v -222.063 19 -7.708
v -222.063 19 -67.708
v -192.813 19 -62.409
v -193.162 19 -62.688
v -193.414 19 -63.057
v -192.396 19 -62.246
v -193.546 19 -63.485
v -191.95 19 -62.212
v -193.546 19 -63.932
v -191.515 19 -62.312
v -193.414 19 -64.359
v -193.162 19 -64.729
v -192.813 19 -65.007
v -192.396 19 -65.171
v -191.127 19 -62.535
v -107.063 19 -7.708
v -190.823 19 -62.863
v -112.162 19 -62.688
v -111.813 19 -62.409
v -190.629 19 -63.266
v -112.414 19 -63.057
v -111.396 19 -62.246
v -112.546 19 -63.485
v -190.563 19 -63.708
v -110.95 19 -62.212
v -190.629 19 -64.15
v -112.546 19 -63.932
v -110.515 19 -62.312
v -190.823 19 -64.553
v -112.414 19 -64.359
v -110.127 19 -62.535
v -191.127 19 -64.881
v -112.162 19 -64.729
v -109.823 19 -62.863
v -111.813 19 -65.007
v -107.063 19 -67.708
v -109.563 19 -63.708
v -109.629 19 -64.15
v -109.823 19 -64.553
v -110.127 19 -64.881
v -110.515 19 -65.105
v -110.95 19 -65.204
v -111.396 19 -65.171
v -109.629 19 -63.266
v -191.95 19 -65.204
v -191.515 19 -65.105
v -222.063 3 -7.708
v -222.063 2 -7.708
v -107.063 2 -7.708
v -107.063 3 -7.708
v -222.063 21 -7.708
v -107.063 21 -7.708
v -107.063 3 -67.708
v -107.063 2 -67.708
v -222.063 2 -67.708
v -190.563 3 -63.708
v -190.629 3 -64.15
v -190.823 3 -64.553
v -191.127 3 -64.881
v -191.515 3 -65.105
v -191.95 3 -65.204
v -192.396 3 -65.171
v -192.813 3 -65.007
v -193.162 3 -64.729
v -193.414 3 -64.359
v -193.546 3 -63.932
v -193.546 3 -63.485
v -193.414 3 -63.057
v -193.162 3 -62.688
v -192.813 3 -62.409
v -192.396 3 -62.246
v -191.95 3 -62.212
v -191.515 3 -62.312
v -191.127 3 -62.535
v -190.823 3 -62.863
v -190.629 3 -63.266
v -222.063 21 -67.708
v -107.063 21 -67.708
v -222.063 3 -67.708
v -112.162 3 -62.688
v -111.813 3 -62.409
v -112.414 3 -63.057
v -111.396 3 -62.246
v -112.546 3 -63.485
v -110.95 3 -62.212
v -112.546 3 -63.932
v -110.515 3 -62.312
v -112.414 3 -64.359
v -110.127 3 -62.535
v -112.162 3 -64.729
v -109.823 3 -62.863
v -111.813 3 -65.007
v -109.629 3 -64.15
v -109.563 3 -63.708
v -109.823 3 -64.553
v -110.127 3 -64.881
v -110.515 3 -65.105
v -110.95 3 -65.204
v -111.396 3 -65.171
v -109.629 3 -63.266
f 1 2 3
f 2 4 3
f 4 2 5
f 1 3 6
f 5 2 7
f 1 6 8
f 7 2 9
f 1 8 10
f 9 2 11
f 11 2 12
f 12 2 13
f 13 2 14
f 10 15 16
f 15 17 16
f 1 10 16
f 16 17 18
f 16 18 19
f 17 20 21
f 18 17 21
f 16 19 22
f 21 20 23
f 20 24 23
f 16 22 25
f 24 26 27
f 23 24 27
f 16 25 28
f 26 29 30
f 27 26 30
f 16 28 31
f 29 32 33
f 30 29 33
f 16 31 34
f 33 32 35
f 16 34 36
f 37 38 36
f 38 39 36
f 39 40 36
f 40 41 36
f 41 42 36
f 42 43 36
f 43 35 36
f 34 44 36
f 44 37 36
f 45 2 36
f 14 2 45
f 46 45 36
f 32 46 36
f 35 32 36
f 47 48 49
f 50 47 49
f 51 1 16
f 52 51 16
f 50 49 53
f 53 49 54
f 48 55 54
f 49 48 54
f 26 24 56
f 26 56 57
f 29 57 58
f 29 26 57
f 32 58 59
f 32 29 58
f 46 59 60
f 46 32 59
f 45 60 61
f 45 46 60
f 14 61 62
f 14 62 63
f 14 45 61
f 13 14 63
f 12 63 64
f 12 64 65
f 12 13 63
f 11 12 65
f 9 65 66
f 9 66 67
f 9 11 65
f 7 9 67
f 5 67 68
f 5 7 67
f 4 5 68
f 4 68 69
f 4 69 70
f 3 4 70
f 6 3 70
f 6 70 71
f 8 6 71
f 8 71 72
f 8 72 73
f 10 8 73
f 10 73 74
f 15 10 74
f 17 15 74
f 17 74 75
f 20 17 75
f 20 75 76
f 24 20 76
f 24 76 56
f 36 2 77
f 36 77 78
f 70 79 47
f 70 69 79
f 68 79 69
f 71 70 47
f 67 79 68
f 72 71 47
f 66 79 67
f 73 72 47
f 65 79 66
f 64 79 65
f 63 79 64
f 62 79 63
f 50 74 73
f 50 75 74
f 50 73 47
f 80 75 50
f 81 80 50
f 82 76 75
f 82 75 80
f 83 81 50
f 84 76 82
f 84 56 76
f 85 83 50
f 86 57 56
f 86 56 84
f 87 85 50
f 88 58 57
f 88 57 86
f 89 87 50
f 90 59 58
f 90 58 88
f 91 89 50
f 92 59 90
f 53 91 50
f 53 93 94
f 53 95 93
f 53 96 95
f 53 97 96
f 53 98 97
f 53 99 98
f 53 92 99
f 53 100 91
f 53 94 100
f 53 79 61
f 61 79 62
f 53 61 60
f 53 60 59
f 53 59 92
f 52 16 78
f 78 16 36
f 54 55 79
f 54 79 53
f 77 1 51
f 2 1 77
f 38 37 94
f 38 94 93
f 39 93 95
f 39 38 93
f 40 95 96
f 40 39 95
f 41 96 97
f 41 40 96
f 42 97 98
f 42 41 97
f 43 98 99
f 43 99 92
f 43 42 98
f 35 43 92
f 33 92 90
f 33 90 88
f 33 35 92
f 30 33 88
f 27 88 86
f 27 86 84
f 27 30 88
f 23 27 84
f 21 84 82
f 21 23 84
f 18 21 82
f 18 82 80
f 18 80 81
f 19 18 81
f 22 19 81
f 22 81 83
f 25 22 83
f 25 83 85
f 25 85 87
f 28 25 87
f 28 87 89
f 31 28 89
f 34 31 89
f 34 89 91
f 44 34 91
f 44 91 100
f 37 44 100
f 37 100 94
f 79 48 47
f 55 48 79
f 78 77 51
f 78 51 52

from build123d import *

# Parameters (mm, degrees)
ESTRUSIONE_ESTRUSIONE1_START = 17
SCHIZZO1_W                   = 115
SCHIZZO1_H                   = 60
ESTRUSIONE_ESTRUSIONE1_DEPTH = 2
SCHIZZO5_R                   = 1.5
ESTRUSIONE_ESTRUSIONE2_DEPTH = 19
SCHIZZO6_R                   = 1.5
ESTRUSIONE_ESTRUSIONE3_DEPTH = 19
SCHIZZO1_3_W                 = 115
SCHIZZO1_3_H                 = 60
ESTRUSIONE_ESTRUSIONE4_DEPTH = 1


with BuildPart() as part:
    # Schizzo1 → Estrusione-Estrusione1 (new body)
    with BuildSketch(Plane(origin=(0, 2, 0), x_dir=(1, 0, 0), z_dir=(0, 1, 0)).offset(ESTRUSIONE_ESTRUSIONE1_START)):
        with Locations((-164.562548693, 37.708245302)):
            Rectangle(SCHIZZO1_W, SCHIZZO1_H)
    extrude(amount=ESTRUSIONE_ESTRUSIONE1_DEPTH)

    # Schizzo5 → Estrusione-Estrusione2 (add)
    with BuildSketch(Plane(origin=(0, 21, 0), x_dir=(1, 0, 0), z_dir=(0, 1, 0))):
        with Locations((-111.062548693, 63.708245302)):
            Circle(SCHIZZO5_R)
    extrude(amount=-ESTRUSIONE_ESTRUSIONE2_DEPTH)

    # Schizzo6 → Estrusione-Estrusione3 (add)
    with BuildSketch(Plane(origin=(0, 21, 0), x_dir=(1, 0, 0), z_dir=(0, 1, 0))):
        with Locations((-192.062548693, 63.708245302)):
            Circle(SCHIZZO6_R)
    extrude(amount=-ESTRUSIONE_ESTRUSIONE3_DEPTH)

    # Schizzo1<3> → Estrusione-Estrusione4 (add)
    with BuildSketch(Plane(origin=(0, 2, 0), x_dir=(1, 0, 0), z_dir=(0, 1, 0))):
        with Locations((-164.562548693, 37.708245302)):
            Rectangle(SCHIZZO1_3_W, SCHIZZO1_3_H)
    extrude(amount=ESTRUSIONE_ESTRUSIONE4_DEPTH)


solid = part.part
